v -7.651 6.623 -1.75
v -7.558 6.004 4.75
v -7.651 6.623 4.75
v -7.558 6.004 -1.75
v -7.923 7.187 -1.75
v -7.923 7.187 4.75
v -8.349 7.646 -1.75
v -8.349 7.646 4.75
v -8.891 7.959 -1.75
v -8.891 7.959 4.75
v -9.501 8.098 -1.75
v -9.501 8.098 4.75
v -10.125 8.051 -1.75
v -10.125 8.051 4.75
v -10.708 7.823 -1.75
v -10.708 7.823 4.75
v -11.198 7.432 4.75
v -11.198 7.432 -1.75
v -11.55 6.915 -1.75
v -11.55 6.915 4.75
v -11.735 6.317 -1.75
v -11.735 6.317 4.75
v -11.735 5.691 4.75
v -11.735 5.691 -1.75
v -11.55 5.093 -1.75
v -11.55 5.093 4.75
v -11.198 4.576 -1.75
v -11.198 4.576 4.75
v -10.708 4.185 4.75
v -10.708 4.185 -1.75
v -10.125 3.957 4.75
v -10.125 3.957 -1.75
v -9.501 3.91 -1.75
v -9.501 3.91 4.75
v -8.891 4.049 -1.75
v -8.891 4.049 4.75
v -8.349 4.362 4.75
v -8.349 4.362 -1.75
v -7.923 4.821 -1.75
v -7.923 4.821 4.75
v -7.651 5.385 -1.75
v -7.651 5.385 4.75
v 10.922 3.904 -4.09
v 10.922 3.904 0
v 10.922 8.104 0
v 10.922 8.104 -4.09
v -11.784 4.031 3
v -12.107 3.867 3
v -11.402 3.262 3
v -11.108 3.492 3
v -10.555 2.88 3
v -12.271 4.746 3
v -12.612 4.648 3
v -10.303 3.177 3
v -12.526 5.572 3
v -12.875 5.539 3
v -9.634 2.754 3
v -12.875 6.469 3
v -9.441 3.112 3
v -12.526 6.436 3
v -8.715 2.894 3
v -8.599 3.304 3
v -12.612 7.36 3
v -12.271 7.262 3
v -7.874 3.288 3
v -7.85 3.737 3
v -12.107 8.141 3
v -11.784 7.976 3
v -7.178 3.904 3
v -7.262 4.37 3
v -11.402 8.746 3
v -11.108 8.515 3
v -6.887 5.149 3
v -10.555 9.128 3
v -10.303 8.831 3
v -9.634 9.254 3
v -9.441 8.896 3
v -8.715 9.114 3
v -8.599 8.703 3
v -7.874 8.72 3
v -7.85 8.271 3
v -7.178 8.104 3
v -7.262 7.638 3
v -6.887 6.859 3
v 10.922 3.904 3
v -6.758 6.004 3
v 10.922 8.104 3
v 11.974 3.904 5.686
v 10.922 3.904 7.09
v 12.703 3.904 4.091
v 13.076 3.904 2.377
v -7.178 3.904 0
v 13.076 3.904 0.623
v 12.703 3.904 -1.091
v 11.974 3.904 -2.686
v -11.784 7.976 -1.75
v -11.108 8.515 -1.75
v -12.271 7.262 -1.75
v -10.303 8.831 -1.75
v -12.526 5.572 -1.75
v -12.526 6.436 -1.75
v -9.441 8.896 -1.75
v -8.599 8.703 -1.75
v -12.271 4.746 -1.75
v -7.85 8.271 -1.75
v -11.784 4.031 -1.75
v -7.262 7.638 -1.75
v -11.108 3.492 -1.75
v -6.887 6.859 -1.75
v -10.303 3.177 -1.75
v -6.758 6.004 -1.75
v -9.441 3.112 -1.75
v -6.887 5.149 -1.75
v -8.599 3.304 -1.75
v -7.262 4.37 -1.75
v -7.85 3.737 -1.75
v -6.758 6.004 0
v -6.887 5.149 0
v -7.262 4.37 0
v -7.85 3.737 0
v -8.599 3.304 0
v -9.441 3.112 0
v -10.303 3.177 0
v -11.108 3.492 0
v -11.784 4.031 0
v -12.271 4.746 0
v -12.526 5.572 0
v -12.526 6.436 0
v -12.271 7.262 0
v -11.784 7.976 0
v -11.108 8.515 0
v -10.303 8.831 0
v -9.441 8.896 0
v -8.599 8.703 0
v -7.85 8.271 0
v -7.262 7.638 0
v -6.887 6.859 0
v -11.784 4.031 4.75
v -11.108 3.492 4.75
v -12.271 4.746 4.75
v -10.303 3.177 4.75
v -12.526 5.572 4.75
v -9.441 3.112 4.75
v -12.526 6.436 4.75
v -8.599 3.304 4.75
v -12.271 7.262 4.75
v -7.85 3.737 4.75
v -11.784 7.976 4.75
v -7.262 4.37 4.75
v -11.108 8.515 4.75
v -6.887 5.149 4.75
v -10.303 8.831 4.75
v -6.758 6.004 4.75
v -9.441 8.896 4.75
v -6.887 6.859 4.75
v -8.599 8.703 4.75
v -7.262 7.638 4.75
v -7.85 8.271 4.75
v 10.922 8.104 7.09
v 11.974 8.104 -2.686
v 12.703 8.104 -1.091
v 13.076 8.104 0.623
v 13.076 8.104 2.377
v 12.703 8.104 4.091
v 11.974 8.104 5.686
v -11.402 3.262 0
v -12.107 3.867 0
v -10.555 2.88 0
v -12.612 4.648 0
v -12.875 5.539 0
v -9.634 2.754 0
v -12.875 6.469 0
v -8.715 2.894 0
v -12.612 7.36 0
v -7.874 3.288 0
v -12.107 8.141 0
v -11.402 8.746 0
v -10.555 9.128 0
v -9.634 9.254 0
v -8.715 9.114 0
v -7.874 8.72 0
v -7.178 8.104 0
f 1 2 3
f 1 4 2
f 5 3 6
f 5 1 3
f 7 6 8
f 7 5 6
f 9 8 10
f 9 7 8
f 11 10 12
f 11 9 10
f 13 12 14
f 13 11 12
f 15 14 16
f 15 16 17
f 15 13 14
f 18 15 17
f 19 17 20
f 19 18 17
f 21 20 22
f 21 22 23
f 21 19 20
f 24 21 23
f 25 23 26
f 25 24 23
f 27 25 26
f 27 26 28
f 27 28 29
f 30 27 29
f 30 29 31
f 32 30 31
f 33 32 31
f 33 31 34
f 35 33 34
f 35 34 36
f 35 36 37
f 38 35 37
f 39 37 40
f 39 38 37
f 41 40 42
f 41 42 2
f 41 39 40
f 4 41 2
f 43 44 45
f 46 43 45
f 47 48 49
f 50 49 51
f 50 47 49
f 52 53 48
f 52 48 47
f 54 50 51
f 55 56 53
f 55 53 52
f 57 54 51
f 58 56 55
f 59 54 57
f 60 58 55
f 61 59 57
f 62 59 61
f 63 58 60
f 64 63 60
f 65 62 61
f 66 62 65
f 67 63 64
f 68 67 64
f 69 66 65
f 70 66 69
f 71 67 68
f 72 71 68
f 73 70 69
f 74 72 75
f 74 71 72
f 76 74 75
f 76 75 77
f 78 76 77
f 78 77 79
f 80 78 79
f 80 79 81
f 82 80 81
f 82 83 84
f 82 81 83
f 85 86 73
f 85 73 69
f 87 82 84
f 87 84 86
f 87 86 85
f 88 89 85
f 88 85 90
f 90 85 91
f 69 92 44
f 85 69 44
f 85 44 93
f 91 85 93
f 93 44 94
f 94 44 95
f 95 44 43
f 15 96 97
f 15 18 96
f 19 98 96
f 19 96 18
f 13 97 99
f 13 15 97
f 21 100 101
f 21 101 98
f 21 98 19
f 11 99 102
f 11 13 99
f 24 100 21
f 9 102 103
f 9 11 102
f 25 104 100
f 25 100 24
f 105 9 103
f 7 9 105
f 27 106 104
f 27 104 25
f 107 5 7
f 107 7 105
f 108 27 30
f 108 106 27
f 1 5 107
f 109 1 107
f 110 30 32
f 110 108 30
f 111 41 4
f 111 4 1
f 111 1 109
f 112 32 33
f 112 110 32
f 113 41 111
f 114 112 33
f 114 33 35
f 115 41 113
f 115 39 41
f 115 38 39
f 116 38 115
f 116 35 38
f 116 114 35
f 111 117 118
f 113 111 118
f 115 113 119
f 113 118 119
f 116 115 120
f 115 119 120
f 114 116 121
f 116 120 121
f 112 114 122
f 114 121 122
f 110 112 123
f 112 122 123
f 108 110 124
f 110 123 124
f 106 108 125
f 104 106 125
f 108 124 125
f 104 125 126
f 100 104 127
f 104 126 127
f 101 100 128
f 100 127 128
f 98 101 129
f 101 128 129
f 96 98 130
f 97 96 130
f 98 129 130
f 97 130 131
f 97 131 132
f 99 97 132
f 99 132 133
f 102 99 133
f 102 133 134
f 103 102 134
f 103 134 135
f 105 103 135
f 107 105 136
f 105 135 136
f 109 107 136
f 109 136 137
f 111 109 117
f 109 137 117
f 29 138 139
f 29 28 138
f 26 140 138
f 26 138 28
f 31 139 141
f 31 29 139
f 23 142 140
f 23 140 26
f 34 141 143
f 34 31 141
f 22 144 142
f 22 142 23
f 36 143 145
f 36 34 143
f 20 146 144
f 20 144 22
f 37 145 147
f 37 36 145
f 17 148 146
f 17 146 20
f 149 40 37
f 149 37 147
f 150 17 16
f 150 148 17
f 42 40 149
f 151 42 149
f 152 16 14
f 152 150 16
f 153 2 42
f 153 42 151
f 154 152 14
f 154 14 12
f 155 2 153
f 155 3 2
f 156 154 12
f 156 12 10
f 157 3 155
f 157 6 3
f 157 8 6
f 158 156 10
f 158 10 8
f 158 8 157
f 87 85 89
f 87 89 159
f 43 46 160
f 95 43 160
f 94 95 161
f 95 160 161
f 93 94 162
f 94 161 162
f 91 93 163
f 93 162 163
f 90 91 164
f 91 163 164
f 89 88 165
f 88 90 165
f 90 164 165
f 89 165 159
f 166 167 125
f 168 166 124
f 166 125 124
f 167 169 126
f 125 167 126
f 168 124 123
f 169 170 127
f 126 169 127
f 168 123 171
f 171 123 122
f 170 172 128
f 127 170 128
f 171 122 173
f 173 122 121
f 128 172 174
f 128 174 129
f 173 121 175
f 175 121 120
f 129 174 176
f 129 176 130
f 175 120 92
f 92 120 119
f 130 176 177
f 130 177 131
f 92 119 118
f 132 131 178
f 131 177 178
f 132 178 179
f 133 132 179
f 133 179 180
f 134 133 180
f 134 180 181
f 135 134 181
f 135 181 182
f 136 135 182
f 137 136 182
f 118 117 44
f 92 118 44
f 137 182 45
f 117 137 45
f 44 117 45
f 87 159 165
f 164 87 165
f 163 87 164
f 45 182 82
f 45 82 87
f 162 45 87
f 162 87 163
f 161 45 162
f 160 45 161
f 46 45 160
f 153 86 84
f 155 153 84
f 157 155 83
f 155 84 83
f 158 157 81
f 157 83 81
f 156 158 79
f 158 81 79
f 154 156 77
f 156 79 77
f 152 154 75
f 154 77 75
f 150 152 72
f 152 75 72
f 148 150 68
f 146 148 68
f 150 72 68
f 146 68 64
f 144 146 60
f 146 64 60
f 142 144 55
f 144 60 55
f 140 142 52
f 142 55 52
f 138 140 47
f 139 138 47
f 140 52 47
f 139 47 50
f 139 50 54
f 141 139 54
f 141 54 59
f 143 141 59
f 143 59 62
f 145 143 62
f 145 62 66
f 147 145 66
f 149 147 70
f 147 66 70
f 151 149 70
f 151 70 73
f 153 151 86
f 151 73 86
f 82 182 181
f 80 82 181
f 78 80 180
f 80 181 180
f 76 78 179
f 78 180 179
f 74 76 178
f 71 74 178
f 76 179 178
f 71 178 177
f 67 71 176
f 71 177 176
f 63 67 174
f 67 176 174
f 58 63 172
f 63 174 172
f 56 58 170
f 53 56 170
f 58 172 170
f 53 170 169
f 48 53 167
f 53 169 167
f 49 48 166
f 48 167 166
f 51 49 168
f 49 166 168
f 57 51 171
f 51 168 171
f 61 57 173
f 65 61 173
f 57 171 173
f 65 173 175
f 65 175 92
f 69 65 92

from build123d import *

# Parameters (mm, degrees)
F0_R      = 2.1
F1_DEPTH  = 3
F2_W      = 7.8759681508
F2_H      = 2.3975596942
F2_H_2    = 2.4024403058
F3_DEPTH  = 25
F2_H_3    = 4.2
F4_DEPTH  = 5
F5_DEPTH  = 8
F7_DEPTH  = 25
F8_R      = 2.9
F8_R_2    = 2.1
F9_DEPTH  = 1.75
F10_R     = 2.9
F10_R_2   = 2.1
F11_DEPTH = 1.75


with BuildPart() as f1:
    # F0 (on Top) → F1 (new body)
    with BuildSketch(Plane.XY):
        Polygon((18.7982146922, 10.5015123645), (10.9222465414, 10.5015123645), (10.9222465414, 8.1039526702), (10.9222465414, 3.9039526702), (10.9222465414, 1.5015123645), (18.7982146922, 1.5015123645), align=None)
        with BuildLine():
            Line((10.9222465414, 3.9039526702), (10.9222465414, 8.1039526702))
            Line((10.9222465414, 8.1039526702), (-7.1777534586, 8.1039526702))
            ThreePointArc((-7.1777534586, 8.1039526702), (-12.9081768095, 6.0039526702), (-7.1777534586, 3.9039526702))
            Line((-7.1777534586, 3.9039526702), (10.9222465414, 3.9039526702))
        make_face()
        with Locations((-9.6581768095, 6.0039526702)):
            Circle(F0_R, mode=Mode.SUBTRACT)
    extrude(amount=F1_DEPTH)

    # F2 (on face) → F3 (cut)
    with BuildSketch(Plane.XY.offset(3)):
        with Locations((14.8602306168, 9.3027325174)):
            Rectangle(F2_W, F2_H)
        with Locations((14.8602306168, 2.7027325174)):
            Rectangle(F2_W, F2_H_2)
    extrude(amount=-F3_DEPTH, mode=Mode.SUBTRACT)

    # F2 (on face) → F4 (join)
    with BuildSketch(Plane.XY.offset(3)):
        with Locations((14.8602306168, 6.0039526702)):
            Rectangle(F2_W, F2_H_3)
    extrude(amount=F4_DEPTH)

    # F2 (on face) → F5 (join)
    with BuildSketch(Plane.XY.offset(3)):
        with Locations((14.8602306168, 6.0039526702)):
            Rectangle(F2_W, F2_H_3)
    extrude(amount=-F5_DEPTH)

    # F6 (on face) → F7 (cut)
    with BuildSketch(Plane(origin=(0, 8.1039526702, 0), x_dir=(-1, 0, 0), z_dir=(0, 1, 0))):
        with BuildLine():
            ThreePointArc((-10.9222465414, -4.0903488442), (-13.1232466414, 1.5), (-10.9222465414, 7.0903488442))
            Line((-10.9222465414, 7.0903488442), (-10.9222465414, 8))
            Line((-10.9222465414, 8), (-18.7982146922, 8))
            Line((-18.7982146922, 8), (-18.7982146922, -5))
            Line((-18.7982146922, -5), (-10.9222465414, -5))
            Line((-10.9222465414, -5), (-10.9222465414, -4.0903488442))
        make_face()
    extrude(amount=-F7_DEPTH, mode=Mode.SUBTRACT)

    # F8 (on face) → F9 (join)
    with BuildSketch(Plane(origin=(0, 0, 0), x_dir=(1, 0, 0), z_dir=(0, 0, -1))):
        with Locations((-9.6581768095, -6.0039526702)):
            Circle(F8_R)
        with Locations((-9.6581768095, -6.0039526702)):
            Circle(F8_R_2, mode=Mode.SUBTRACT)
    extrude(amount=F9_DEPTH)

    # F10 (on face) → F11 (join)
    with BuildSketch(Plane.XY.offset(3)):
        with Locations((-9.6581768095, 6.0039526702)):
            Circle(F10_R)
        with Locations((-9.6581768095, 6.0039526702)):
            Circle(F10_R_2, mode=Mode.SUBTRACT)
    extrude(amount=F11_DEPTH)


solid = f1.part
